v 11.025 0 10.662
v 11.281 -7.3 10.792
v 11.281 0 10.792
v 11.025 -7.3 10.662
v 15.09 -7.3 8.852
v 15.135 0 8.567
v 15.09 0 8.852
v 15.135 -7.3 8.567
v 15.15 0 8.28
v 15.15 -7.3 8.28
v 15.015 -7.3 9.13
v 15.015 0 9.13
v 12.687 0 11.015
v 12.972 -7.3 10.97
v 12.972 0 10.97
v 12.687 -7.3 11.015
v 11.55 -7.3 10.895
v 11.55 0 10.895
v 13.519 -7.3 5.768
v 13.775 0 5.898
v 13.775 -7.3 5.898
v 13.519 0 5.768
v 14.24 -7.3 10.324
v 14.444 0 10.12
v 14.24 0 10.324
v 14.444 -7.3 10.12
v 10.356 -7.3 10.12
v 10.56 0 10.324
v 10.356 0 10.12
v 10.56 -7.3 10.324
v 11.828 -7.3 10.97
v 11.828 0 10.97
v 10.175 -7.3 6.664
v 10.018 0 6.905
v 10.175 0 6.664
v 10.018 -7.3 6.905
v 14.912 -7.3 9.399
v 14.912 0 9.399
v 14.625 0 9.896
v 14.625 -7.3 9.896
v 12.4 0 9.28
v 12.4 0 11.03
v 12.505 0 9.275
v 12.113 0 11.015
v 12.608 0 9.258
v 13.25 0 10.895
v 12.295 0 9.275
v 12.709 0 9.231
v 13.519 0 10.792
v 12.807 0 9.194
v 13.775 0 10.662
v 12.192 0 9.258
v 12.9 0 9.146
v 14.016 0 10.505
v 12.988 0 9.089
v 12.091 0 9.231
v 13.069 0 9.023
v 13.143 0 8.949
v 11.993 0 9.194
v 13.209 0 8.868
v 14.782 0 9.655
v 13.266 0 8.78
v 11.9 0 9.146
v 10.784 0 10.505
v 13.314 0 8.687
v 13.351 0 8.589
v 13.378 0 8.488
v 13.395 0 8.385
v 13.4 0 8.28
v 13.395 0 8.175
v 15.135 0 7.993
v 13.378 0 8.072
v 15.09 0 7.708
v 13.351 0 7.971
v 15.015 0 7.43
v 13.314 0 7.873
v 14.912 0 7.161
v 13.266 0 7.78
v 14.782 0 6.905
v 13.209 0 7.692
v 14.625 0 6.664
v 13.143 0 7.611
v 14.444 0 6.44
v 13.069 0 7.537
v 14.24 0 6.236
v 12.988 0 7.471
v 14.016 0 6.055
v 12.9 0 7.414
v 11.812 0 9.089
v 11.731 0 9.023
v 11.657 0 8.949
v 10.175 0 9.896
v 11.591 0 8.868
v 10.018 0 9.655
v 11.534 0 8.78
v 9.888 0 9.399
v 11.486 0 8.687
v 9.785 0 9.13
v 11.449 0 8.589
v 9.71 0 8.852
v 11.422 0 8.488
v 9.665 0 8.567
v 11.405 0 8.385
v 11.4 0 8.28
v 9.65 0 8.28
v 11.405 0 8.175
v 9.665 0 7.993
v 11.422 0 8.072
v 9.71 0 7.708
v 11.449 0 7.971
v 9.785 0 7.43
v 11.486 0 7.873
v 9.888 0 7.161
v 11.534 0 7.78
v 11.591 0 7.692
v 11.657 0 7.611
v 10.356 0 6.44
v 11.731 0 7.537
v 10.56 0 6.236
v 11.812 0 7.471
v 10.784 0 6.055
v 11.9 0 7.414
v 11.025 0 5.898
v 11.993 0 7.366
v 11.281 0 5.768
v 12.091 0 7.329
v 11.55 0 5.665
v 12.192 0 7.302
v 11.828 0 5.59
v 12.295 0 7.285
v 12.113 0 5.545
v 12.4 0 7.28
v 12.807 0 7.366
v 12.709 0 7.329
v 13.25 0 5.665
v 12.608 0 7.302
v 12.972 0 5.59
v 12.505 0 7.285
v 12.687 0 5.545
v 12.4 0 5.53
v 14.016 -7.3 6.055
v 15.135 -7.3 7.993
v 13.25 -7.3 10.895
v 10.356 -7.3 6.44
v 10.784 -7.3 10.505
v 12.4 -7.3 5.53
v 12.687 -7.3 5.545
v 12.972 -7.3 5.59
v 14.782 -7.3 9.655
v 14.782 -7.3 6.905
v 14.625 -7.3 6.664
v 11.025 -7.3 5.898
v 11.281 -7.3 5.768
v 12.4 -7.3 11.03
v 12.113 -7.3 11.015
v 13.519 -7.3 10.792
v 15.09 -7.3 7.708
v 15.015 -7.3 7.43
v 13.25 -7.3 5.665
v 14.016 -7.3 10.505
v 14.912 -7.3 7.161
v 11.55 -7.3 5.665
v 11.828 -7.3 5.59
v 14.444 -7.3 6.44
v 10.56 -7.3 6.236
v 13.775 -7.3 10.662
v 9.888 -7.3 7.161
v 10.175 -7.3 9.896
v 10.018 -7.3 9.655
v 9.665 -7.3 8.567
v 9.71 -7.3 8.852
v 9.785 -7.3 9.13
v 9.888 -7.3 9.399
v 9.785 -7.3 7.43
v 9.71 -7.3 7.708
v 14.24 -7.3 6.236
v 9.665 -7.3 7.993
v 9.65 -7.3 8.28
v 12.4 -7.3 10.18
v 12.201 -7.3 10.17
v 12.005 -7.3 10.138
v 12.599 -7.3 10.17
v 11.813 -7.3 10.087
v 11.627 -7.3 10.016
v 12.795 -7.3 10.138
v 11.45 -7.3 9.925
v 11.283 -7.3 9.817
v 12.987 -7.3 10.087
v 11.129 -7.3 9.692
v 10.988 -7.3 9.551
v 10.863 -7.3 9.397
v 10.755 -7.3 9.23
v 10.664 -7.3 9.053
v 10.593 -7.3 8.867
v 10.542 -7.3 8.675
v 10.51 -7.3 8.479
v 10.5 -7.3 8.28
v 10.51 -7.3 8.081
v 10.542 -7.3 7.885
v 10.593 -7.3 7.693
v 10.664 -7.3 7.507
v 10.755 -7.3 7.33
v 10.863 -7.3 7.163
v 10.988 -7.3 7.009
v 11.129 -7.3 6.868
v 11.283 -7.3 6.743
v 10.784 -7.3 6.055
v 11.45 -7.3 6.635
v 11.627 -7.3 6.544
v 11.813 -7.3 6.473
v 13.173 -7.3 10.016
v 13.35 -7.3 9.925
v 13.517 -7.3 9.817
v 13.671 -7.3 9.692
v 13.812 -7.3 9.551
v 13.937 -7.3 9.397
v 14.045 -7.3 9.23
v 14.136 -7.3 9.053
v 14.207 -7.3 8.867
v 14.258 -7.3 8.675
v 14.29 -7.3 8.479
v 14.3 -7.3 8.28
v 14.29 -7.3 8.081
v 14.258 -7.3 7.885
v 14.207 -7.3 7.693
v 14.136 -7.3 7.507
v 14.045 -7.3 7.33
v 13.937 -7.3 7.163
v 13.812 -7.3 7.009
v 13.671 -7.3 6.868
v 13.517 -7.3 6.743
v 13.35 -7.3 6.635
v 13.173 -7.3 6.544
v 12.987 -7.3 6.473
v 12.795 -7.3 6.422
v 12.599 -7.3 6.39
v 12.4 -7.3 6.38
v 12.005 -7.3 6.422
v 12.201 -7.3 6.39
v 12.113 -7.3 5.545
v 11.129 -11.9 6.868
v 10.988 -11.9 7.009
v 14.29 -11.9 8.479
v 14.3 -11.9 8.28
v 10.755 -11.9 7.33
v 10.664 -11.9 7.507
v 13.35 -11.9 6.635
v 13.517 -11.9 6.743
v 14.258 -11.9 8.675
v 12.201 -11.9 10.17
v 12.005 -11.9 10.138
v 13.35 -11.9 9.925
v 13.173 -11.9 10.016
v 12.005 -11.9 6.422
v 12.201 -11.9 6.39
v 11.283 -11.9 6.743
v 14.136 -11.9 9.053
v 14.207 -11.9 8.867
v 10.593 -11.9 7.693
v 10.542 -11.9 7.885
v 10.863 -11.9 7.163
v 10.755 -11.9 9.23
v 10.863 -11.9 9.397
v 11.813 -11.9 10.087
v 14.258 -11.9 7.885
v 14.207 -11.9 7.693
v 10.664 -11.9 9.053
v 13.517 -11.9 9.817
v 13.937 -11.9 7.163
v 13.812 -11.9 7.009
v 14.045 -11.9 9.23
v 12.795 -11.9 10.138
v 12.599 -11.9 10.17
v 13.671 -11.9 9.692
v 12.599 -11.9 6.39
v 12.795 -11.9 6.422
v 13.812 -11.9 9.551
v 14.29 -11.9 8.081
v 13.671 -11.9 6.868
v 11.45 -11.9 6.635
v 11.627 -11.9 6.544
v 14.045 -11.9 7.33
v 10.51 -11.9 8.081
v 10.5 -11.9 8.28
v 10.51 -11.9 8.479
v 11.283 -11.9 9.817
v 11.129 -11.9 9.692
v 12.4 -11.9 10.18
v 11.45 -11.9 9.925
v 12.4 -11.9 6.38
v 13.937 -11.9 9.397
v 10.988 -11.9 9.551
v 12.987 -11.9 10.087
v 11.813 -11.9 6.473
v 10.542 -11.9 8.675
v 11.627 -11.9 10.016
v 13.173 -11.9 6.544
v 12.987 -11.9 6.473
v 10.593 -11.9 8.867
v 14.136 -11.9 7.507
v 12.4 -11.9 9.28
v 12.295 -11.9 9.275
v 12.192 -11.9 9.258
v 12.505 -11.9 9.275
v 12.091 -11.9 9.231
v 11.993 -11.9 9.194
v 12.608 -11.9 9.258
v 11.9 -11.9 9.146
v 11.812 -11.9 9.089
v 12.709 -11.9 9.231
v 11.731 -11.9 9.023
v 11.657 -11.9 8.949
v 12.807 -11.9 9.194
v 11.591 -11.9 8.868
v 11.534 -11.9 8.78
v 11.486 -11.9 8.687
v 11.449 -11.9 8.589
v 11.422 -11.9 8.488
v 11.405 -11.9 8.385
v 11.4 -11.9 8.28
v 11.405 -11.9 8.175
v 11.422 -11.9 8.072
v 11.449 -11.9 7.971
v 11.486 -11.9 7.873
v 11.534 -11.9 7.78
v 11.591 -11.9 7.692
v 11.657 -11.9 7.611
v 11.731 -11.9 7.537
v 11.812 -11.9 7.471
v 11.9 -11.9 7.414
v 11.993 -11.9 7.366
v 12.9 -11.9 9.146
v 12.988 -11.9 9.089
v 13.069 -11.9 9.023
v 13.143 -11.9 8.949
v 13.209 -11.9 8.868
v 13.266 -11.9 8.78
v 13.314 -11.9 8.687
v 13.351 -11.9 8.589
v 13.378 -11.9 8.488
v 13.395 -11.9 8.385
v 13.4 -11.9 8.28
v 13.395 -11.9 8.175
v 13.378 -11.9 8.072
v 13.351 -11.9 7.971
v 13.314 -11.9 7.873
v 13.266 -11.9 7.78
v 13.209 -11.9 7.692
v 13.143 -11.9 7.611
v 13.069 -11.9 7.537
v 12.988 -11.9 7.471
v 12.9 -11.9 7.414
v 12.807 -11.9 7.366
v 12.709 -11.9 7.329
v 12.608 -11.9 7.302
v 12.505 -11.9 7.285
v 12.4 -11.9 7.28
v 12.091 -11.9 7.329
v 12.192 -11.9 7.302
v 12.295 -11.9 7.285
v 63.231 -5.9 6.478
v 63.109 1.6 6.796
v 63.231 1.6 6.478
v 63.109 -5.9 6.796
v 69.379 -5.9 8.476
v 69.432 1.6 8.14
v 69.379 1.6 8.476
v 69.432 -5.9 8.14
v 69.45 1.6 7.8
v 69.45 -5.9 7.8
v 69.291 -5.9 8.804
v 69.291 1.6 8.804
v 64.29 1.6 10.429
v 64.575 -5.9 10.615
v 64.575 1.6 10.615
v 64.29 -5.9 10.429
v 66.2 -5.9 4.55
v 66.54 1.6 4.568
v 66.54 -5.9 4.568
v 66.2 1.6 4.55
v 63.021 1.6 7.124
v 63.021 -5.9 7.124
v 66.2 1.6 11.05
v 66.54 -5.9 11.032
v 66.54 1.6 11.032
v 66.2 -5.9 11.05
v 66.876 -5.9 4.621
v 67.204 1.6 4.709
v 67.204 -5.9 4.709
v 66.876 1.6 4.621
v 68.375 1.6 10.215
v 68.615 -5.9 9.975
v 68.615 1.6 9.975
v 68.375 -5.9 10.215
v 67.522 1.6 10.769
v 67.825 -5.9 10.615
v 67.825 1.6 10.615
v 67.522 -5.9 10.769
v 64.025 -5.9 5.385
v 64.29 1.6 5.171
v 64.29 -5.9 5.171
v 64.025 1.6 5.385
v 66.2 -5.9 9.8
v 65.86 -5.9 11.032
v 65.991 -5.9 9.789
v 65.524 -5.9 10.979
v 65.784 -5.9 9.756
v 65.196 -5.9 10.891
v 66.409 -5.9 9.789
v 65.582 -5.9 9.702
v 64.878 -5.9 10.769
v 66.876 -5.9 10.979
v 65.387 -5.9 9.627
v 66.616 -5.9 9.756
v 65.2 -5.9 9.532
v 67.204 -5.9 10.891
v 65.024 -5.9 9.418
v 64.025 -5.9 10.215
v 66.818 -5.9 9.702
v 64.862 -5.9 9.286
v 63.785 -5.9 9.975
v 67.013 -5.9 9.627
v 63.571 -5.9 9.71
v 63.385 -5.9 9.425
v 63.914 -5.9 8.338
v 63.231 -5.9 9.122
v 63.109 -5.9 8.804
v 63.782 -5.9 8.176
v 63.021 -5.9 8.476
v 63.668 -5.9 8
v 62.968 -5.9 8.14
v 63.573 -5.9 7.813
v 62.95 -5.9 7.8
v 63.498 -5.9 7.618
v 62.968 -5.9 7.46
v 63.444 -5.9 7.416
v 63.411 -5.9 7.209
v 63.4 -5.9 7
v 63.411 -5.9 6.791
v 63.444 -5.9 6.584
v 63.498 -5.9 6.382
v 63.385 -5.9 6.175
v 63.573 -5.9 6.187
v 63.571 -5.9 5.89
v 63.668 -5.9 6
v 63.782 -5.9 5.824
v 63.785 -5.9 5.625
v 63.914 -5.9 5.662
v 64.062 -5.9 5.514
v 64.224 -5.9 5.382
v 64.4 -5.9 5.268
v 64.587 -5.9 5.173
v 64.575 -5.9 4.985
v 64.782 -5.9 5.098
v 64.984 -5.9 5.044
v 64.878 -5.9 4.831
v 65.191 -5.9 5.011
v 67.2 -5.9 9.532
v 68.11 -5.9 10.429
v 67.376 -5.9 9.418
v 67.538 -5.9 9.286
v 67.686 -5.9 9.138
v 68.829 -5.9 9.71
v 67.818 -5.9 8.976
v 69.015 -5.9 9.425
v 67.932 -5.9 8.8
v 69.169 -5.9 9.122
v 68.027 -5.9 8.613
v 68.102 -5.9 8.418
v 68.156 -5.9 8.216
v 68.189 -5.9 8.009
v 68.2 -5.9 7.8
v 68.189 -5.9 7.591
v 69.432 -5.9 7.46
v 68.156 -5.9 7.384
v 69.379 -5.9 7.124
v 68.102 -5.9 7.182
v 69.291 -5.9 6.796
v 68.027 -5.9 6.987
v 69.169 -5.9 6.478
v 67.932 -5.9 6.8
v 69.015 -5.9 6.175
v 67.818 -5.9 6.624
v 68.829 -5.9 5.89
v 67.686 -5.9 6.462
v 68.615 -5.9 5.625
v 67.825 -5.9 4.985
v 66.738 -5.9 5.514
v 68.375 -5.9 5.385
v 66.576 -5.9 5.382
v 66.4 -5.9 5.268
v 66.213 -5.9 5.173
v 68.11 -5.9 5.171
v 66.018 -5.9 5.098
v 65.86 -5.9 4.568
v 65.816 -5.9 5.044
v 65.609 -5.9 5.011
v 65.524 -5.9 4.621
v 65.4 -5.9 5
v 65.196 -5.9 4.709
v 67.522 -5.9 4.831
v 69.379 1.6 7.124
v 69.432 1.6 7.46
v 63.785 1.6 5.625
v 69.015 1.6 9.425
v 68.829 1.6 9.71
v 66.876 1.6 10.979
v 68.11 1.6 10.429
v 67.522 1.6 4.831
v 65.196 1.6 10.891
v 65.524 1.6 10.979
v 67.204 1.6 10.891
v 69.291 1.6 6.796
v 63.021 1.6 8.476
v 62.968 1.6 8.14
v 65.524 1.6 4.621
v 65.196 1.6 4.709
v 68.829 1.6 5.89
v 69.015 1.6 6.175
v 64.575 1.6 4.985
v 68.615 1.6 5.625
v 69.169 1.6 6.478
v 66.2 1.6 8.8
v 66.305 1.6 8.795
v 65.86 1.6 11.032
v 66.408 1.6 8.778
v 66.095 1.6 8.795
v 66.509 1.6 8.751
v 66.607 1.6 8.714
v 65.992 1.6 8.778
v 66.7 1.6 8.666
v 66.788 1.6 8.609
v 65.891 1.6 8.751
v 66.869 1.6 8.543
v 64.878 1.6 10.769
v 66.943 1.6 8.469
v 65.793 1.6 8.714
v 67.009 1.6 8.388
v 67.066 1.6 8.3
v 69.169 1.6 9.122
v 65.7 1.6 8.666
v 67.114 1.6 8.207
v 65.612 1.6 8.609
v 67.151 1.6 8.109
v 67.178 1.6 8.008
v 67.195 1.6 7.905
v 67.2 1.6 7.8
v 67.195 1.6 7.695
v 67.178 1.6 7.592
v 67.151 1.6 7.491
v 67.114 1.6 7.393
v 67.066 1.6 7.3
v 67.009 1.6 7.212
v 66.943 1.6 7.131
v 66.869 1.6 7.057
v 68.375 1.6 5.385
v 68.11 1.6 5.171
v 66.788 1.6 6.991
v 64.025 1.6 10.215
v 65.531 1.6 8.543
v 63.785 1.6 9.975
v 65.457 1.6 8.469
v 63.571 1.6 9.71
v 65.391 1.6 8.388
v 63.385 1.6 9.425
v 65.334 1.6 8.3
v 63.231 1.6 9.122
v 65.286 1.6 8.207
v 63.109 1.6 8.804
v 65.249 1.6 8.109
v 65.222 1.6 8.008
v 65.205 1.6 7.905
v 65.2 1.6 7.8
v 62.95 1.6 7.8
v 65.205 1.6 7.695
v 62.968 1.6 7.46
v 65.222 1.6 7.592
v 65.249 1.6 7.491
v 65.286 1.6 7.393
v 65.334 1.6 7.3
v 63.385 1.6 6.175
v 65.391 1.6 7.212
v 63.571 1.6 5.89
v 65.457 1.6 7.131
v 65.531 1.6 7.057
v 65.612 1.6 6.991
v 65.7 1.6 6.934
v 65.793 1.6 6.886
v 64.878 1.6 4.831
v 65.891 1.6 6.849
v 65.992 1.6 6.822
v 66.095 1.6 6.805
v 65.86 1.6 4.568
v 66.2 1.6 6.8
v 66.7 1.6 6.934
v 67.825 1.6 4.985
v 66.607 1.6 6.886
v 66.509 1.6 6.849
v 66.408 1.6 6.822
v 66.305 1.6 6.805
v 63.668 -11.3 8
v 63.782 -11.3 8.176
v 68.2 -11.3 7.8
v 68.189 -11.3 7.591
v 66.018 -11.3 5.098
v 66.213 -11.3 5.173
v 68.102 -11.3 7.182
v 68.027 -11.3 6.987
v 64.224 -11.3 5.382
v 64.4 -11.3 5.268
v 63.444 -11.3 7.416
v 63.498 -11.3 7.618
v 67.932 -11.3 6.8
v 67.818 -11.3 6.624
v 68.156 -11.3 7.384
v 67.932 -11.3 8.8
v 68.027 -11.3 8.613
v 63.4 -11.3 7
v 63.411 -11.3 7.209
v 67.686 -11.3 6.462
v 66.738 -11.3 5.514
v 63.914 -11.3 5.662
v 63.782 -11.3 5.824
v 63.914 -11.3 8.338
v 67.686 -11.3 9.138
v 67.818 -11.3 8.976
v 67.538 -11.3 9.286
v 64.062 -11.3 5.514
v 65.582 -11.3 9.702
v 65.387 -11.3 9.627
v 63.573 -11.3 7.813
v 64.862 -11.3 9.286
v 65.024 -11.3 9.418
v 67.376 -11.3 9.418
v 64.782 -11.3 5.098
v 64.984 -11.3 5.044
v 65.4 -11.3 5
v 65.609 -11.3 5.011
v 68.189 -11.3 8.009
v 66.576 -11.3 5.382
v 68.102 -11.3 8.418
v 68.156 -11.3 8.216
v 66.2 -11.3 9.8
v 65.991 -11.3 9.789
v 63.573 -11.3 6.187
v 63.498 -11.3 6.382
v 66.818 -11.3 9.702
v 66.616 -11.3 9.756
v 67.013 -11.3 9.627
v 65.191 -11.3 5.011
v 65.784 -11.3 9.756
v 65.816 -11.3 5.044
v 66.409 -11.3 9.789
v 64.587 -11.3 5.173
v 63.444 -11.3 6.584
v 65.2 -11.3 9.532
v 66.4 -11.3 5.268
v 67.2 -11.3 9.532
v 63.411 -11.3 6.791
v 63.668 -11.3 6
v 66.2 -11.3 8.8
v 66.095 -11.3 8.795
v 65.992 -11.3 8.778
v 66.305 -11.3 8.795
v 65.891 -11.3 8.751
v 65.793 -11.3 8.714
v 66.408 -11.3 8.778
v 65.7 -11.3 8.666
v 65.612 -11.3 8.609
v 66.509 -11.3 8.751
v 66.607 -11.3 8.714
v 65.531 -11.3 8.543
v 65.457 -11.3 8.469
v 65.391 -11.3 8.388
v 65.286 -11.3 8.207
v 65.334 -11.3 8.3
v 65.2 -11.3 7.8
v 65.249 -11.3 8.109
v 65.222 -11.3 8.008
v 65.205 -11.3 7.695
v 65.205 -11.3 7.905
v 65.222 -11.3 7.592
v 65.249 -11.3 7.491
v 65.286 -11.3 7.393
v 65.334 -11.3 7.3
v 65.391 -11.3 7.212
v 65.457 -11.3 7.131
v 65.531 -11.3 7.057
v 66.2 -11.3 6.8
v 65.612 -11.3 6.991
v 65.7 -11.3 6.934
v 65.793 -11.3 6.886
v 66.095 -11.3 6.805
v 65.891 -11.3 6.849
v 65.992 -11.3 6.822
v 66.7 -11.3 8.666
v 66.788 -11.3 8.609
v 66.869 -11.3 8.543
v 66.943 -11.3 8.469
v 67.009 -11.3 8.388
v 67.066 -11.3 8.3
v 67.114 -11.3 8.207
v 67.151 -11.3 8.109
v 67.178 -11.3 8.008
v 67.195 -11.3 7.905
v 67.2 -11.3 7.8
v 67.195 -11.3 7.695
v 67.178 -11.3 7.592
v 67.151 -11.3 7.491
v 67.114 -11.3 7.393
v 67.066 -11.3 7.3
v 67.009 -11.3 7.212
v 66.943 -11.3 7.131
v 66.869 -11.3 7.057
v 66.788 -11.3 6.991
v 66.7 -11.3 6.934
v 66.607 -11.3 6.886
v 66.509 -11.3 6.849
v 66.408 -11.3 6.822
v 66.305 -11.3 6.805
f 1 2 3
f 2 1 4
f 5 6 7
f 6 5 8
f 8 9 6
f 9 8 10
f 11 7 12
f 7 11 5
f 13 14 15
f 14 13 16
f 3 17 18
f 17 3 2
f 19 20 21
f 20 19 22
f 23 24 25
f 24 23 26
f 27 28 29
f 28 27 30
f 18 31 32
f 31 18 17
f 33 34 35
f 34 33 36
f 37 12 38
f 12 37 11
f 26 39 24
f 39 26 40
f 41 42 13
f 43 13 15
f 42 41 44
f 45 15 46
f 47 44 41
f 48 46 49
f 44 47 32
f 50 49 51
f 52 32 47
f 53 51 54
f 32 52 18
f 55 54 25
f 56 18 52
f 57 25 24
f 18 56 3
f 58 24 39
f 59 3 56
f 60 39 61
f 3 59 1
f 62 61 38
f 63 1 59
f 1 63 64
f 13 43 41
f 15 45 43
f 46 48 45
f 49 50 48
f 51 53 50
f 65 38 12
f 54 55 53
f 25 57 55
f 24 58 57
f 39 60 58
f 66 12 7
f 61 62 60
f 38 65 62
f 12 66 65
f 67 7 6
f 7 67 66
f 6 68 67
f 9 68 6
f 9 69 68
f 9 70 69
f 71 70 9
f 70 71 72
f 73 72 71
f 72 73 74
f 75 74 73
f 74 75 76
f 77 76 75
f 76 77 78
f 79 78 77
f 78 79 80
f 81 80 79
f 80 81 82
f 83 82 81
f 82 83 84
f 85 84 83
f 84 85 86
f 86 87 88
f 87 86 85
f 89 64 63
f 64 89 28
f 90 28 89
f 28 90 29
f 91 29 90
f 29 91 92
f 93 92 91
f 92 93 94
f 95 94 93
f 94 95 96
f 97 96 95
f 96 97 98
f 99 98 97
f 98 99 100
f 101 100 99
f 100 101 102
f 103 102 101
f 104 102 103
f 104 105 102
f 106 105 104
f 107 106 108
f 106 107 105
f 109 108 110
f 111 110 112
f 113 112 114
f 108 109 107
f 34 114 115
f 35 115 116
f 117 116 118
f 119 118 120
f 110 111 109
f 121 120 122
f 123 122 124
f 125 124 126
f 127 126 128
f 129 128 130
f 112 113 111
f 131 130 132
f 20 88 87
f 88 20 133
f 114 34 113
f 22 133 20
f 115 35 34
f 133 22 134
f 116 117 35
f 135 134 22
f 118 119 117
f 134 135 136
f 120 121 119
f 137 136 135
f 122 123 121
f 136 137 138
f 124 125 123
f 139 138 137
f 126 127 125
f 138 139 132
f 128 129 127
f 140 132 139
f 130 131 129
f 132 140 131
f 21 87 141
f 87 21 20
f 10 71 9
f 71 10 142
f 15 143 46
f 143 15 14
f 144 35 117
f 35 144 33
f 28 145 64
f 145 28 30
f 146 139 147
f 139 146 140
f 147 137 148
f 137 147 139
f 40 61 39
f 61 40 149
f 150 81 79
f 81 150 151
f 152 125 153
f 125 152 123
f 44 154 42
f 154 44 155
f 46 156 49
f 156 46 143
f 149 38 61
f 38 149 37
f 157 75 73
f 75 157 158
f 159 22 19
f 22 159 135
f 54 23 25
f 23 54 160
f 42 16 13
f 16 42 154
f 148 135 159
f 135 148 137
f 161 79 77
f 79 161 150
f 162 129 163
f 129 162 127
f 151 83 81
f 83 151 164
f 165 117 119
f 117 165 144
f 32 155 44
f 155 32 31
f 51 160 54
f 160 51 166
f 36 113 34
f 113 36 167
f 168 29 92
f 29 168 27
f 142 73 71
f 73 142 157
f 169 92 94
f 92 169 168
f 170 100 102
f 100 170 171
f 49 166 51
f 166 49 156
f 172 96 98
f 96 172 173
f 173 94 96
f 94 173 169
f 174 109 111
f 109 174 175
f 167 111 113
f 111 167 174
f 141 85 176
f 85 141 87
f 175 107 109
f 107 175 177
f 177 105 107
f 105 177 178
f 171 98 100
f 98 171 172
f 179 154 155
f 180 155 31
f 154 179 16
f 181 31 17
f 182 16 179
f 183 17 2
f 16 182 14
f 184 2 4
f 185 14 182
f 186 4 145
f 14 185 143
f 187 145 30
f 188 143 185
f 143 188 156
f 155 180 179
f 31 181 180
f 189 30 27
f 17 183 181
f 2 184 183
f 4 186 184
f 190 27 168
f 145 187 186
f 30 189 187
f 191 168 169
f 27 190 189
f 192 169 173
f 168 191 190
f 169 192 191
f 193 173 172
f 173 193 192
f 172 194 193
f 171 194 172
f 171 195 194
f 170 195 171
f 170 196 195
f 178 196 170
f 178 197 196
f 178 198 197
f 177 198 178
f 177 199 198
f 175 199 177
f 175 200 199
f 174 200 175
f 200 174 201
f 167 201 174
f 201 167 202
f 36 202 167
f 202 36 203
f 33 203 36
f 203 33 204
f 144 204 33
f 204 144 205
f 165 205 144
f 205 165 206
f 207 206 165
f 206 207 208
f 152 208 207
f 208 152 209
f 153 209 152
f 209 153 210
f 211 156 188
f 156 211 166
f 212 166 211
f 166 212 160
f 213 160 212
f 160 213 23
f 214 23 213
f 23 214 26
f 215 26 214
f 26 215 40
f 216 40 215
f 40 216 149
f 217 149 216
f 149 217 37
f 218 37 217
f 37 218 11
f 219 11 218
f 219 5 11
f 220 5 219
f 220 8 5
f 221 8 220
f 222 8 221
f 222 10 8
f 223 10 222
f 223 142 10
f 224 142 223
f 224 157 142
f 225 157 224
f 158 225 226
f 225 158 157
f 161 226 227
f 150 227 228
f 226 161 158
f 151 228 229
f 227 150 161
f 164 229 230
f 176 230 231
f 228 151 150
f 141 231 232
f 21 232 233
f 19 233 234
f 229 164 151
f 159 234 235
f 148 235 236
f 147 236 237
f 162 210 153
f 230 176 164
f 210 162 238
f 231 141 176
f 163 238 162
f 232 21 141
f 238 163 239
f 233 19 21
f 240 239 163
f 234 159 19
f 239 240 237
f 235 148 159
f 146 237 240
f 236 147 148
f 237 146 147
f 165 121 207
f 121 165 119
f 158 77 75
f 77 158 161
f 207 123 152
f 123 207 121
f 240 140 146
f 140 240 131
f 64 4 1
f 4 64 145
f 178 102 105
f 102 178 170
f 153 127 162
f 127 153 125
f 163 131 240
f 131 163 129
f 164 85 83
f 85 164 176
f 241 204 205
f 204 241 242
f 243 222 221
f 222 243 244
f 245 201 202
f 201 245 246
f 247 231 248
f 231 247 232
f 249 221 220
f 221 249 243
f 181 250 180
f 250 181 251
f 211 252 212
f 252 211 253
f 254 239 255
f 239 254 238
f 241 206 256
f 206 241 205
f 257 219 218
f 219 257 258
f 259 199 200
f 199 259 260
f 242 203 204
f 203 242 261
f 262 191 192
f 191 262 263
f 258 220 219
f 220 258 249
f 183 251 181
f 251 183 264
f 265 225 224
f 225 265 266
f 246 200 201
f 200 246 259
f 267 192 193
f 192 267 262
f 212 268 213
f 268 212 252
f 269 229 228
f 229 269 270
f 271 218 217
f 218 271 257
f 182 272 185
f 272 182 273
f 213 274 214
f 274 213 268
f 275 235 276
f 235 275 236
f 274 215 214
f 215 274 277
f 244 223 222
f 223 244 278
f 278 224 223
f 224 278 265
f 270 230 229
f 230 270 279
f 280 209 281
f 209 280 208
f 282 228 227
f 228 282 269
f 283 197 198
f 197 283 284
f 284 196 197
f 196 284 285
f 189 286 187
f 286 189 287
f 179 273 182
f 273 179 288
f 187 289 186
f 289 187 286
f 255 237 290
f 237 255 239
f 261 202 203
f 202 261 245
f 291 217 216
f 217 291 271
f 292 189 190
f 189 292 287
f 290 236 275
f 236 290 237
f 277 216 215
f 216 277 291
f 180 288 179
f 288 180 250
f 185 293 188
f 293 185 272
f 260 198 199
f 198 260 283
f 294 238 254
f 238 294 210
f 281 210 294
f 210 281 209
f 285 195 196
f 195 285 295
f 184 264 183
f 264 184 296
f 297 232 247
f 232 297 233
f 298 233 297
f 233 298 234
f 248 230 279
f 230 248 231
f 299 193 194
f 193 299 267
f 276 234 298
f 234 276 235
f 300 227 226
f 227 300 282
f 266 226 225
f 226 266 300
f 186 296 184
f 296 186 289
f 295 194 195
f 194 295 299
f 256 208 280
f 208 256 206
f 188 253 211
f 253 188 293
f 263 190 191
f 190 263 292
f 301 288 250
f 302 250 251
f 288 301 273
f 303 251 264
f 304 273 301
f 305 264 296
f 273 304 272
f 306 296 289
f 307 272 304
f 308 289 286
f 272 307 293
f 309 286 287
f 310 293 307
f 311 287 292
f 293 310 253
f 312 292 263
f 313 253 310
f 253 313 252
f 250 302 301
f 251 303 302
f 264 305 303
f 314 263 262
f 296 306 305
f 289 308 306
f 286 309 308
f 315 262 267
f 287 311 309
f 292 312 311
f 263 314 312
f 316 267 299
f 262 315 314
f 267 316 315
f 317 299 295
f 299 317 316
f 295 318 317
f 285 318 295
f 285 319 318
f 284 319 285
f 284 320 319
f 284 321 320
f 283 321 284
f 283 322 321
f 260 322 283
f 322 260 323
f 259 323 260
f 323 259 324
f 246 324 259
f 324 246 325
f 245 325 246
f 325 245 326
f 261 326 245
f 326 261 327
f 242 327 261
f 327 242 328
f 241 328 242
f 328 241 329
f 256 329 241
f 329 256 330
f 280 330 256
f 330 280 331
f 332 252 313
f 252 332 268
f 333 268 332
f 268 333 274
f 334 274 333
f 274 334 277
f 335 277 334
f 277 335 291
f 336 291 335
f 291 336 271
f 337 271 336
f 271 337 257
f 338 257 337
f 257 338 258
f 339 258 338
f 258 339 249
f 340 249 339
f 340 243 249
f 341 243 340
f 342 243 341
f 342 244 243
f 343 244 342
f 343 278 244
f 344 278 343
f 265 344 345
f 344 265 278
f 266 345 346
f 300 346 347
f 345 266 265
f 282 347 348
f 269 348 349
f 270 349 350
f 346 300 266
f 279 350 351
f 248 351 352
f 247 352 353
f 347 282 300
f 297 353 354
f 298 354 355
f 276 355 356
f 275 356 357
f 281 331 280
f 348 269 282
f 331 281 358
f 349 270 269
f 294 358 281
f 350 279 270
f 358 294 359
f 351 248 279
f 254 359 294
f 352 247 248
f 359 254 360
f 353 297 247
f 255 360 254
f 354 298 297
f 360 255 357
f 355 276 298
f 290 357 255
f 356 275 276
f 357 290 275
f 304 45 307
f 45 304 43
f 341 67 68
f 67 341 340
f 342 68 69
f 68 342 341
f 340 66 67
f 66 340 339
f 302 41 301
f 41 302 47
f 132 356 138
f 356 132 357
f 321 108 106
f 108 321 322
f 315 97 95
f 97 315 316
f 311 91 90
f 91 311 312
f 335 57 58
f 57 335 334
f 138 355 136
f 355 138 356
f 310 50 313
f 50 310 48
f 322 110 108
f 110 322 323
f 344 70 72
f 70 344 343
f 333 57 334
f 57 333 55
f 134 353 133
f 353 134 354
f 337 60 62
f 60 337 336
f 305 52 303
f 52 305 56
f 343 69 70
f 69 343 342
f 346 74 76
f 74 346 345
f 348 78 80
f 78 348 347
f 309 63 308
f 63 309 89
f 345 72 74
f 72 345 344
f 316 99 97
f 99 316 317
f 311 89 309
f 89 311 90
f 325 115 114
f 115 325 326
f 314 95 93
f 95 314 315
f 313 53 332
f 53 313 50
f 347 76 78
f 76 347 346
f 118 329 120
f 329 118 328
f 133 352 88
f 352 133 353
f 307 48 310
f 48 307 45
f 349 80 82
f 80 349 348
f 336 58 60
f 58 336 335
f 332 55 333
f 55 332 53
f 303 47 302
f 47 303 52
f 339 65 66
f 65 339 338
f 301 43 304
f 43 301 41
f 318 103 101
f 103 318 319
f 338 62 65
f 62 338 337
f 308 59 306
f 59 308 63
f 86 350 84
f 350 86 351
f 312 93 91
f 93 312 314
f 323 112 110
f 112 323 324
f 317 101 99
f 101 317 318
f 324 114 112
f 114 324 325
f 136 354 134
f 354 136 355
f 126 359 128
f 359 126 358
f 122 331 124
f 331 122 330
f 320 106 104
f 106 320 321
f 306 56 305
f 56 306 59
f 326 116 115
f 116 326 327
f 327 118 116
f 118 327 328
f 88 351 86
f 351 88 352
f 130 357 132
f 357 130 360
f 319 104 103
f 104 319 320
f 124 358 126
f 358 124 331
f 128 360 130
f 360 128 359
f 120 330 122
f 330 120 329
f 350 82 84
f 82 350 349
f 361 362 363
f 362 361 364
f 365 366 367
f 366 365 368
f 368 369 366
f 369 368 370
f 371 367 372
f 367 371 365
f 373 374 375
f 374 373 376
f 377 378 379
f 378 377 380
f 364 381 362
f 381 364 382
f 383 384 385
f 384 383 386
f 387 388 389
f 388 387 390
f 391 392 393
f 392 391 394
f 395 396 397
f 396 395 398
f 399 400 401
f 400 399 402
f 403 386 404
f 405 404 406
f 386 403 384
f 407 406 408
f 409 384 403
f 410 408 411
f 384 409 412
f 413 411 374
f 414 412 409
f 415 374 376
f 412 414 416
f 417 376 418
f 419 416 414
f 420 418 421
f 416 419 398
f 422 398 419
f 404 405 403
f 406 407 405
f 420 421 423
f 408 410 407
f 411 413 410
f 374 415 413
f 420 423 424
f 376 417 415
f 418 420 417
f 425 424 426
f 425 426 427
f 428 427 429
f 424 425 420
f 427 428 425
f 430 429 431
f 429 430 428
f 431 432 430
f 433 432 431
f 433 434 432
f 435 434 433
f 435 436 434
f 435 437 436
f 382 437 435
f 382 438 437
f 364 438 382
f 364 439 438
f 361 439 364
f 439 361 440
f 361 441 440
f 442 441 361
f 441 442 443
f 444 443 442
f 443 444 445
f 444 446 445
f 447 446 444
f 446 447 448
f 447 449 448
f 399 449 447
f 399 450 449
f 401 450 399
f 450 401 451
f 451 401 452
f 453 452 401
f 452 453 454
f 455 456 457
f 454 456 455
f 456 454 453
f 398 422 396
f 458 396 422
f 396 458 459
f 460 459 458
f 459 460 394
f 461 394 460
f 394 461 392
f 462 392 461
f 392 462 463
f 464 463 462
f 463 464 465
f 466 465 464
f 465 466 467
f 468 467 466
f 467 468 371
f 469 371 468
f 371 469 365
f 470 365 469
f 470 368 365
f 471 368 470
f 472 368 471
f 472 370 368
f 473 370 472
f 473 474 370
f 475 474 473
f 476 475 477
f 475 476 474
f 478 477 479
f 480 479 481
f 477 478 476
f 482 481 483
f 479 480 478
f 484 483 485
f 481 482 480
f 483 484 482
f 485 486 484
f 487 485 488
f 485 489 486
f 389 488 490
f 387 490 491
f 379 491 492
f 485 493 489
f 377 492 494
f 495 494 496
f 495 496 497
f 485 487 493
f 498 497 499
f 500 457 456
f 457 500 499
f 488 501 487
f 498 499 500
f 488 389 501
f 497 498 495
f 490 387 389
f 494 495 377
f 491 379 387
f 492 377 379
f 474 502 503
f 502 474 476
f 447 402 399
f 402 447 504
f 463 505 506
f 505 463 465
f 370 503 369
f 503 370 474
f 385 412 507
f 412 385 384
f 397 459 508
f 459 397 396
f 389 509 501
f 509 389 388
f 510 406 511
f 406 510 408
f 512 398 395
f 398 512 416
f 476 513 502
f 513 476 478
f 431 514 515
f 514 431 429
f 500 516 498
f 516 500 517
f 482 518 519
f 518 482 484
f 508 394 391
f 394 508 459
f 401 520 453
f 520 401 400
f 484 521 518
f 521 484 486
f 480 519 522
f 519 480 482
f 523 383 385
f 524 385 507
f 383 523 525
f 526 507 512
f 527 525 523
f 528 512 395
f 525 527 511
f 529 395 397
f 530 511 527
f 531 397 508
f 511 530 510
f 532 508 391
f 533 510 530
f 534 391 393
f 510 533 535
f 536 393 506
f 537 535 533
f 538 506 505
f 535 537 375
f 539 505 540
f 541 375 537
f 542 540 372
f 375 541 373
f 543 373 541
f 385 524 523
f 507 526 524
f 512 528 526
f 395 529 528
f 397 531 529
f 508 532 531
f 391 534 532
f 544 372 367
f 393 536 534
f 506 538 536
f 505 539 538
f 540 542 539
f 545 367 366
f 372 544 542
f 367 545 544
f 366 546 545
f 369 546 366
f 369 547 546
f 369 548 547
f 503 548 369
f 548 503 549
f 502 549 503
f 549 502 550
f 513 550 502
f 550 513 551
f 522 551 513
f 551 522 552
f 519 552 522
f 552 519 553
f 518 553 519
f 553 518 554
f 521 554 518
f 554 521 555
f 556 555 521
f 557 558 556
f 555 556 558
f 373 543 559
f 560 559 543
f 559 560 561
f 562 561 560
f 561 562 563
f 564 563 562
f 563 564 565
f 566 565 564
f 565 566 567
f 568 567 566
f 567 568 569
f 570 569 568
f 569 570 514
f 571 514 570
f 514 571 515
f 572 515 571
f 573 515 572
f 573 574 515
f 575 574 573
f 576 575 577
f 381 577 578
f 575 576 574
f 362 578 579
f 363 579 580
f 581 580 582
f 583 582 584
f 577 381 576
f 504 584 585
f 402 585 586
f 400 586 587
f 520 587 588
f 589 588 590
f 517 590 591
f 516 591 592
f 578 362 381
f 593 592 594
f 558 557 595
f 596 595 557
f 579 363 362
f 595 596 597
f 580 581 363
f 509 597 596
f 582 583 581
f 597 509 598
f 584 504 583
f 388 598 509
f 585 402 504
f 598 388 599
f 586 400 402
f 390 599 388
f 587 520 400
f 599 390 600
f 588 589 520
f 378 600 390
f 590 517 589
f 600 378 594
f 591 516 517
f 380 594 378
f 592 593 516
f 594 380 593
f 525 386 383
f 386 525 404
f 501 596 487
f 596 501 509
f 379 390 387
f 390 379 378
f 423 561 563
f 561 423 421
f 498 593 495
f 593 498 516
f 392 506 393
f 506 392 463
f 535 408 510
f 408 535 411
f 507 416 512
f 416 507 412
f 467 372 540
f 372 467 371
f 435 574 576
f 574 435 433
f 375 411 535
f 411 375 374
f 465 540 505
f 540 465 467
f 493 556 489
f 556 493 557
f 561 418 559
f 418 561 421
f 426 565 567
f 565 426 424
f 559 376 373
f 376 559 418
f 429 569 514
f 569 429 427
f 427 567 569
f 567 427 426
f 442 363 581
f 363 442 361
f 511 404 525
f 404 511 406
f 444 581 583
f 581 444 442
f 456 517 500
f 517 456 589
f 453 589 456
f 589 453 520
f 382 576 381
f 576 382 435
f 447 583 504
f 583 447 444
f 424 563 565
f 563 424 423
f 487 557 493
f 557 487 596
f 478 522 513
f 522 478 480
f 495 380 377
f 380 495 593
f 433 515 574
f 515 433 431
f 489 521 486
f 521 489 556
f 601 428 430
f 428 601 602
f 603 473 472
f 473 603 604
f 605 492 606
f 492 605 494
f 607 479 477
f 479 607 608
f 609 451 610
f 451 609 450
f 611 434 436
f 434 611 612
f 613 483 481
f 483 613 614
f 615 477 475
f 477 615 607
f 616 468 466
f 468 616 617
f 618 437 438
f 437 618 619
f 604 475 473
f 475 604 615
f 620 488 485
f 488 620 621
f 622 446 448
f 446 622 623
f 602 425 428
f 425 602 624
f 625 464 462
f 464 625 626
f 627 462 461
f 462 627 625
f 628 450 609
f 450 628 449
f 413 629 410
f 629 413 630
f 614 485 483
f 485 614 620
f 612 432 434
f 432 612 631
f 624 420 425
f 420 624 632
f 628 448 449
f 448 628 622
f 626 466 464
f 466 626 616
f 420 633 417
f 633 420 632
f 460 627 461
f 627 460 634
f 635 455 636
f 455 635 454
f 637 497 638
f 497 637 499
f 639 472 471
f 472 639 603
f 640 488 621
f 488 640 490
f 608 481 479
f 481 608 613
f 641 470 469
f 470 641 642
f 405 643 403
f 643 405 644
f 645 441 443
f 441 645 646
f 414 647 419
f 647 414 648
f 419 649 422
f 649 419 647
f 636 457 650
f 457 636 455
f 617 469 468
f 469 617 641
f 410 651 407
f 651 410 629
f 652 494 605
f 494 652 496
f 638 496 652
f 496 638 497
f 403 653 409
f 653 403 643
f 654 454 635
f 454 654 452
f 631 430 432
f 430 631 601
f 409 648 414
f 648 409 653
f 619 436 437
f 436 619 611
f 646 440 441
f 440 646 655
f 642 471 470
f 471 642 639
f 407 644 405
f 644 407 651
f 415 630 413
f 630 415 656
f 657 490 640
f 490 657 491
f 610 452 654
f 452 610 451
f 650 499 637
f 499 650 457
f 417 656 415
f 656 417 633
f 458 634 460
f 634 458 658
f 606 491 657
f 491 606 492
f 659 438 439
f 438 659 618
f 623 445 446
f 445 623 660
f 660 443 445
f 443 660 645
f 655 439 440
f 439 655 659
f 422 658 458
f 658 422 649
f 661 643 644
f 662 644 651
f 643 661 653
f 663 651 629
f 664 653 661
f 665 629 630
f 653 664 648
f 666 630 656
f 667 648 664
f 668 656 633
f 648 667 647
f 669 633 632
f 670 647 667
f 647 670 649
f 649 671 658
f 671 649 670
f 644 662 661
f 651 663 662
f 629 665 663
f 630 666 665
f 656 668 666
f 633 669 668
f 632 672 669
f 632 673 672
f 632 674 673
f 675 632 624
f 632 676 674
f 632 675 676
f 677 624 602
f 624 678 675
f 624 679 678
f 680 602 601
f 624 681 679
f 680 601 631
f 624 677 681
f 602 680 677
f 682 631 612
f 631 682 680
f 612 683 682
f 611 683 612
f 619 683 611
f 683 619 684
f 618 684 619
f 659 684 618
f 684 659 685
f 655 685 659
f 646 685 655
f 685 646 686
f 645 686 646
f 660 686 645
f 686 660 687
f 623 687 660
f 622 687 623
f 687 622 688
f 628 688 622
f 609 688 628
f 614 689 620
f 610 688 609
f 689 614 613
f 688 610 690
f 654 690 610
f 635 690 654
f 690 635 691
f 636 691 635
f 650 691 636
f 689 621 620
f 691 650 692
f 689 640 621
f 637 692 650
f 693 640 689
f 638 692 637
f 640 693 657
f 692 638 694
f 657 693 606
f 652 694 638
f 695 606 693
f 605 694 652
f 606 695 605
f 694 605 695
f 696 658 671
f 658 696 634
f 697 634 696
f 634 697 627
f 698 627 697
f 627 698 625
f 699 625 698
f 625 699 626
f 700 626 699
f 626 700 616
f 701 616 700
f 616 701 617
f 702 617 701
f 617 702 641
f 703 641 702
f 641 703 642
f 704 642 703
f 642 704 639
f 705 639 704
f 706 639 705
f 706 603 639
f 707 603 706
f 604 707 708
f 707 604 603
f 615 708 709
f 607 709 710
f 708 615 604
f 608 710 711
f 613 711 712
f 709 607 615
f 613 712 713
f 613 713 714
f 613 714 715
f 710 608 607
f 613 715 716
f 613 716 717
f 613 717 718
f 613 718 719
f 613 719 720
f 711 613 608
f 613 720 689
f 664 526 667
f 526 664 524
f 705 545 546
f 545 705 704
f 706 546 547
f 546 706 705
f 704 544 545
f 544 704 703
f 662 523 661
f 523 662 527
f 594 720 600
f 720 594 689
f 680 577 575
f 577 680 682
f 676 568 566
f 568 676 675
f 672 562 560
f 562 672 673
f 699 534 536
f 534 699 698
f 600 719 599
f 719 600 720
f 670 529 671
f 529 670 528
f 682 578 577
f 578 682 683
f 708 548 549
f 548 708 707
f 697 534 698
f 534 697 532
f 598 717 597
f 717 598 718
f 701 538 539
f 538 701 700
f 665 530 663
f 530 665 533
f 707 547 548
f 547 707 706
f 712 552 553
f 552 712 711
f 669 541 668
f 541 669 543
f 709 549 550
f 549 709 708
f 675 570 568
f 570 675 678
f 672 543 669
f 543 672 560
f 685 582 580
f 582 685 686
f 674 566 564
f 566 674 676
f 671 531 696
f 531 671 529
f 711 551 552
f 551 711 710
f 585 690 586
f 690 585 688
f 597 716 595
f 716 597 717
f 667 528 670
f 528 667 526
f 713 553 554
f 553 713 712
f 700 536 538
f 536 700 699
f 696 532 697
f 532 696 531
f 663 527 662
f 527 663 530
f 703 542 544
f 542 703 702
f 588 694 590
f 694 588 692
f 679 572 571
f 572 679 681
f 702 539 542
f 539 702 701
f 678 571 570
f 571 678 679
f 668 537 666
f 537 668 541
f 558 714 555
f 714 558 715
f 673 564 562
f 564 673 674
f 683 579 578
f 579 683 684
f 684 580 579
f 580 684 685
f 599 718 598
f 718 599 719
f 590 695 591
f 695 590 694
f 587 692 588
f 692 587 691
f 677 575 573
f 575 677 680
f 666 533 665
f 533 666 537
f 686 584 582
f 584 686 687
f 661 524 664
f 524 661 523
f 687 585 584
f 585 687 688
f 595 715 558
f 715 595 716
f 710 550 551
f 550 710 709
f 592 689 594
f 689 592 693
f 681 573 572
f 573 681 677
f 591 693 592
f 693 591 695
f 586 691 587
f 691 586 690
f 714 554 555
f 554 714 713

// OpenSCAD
$fn=60;


end=70;
y=1;
z=-1;
*for (i = [0:end-1])
{
	translate([i,y,z])
		color([ceil(((i+1)%10)/9), i%2, i%2])
			cube([1,1,1]);
}

trigger_puller();



module trigger_puller()
{
	difference()
	{
		intersection()
		{
			translate([0,10,0])
			rotate(90,[1,0,0])
			linear_extrude(10)
			{
				scale(0.0618)
				import("profiles/trigger_puller.dxf");
			}


			translate([69.5,0,20])
			rotate(180,[0,1,0])
			linear_extrude(20)
			{
				scale(0.0615)
				import("profiles/trigger_puller_side.dxf");
			}
			
		}
		
		#translate([0,4,0])
			cube([100,5,4.4]);

		translate([41,3,6.52])
			cube([9.7,5,5]);

		#translate([41,3,0])
			cube([12,5,4.4]);

		translate([0,0,0])
			cube([100,1.518,4.4]);
	}
	
	translate([-5.5/2+15.15,0,8.28])
		rotate(90,[1,0,0])
			difference()
			{
				union()
				{
					cylinder(7.3,d=5.5);
					translate([0,0,7.3])
					cylinder(4.6,d=3.8);	
				}
				cylinder(7.3+4.6+1,d=2);
			}

	translate([66.2,1.6,7.8])
		rotate(90,[1,0,0])
			difference()
			{
				union()
				{
					cylinder(7.5,d=6.5);
					translate([0,0,7.3])
					hull()
					{
						cylinder(5.6,d=4);
						translate([-0.8,-0.8,0])
						cylinder(5.6,d=4);
					}
				}
				cylinder(7.5+5.6+1,d=2);
			}

}
